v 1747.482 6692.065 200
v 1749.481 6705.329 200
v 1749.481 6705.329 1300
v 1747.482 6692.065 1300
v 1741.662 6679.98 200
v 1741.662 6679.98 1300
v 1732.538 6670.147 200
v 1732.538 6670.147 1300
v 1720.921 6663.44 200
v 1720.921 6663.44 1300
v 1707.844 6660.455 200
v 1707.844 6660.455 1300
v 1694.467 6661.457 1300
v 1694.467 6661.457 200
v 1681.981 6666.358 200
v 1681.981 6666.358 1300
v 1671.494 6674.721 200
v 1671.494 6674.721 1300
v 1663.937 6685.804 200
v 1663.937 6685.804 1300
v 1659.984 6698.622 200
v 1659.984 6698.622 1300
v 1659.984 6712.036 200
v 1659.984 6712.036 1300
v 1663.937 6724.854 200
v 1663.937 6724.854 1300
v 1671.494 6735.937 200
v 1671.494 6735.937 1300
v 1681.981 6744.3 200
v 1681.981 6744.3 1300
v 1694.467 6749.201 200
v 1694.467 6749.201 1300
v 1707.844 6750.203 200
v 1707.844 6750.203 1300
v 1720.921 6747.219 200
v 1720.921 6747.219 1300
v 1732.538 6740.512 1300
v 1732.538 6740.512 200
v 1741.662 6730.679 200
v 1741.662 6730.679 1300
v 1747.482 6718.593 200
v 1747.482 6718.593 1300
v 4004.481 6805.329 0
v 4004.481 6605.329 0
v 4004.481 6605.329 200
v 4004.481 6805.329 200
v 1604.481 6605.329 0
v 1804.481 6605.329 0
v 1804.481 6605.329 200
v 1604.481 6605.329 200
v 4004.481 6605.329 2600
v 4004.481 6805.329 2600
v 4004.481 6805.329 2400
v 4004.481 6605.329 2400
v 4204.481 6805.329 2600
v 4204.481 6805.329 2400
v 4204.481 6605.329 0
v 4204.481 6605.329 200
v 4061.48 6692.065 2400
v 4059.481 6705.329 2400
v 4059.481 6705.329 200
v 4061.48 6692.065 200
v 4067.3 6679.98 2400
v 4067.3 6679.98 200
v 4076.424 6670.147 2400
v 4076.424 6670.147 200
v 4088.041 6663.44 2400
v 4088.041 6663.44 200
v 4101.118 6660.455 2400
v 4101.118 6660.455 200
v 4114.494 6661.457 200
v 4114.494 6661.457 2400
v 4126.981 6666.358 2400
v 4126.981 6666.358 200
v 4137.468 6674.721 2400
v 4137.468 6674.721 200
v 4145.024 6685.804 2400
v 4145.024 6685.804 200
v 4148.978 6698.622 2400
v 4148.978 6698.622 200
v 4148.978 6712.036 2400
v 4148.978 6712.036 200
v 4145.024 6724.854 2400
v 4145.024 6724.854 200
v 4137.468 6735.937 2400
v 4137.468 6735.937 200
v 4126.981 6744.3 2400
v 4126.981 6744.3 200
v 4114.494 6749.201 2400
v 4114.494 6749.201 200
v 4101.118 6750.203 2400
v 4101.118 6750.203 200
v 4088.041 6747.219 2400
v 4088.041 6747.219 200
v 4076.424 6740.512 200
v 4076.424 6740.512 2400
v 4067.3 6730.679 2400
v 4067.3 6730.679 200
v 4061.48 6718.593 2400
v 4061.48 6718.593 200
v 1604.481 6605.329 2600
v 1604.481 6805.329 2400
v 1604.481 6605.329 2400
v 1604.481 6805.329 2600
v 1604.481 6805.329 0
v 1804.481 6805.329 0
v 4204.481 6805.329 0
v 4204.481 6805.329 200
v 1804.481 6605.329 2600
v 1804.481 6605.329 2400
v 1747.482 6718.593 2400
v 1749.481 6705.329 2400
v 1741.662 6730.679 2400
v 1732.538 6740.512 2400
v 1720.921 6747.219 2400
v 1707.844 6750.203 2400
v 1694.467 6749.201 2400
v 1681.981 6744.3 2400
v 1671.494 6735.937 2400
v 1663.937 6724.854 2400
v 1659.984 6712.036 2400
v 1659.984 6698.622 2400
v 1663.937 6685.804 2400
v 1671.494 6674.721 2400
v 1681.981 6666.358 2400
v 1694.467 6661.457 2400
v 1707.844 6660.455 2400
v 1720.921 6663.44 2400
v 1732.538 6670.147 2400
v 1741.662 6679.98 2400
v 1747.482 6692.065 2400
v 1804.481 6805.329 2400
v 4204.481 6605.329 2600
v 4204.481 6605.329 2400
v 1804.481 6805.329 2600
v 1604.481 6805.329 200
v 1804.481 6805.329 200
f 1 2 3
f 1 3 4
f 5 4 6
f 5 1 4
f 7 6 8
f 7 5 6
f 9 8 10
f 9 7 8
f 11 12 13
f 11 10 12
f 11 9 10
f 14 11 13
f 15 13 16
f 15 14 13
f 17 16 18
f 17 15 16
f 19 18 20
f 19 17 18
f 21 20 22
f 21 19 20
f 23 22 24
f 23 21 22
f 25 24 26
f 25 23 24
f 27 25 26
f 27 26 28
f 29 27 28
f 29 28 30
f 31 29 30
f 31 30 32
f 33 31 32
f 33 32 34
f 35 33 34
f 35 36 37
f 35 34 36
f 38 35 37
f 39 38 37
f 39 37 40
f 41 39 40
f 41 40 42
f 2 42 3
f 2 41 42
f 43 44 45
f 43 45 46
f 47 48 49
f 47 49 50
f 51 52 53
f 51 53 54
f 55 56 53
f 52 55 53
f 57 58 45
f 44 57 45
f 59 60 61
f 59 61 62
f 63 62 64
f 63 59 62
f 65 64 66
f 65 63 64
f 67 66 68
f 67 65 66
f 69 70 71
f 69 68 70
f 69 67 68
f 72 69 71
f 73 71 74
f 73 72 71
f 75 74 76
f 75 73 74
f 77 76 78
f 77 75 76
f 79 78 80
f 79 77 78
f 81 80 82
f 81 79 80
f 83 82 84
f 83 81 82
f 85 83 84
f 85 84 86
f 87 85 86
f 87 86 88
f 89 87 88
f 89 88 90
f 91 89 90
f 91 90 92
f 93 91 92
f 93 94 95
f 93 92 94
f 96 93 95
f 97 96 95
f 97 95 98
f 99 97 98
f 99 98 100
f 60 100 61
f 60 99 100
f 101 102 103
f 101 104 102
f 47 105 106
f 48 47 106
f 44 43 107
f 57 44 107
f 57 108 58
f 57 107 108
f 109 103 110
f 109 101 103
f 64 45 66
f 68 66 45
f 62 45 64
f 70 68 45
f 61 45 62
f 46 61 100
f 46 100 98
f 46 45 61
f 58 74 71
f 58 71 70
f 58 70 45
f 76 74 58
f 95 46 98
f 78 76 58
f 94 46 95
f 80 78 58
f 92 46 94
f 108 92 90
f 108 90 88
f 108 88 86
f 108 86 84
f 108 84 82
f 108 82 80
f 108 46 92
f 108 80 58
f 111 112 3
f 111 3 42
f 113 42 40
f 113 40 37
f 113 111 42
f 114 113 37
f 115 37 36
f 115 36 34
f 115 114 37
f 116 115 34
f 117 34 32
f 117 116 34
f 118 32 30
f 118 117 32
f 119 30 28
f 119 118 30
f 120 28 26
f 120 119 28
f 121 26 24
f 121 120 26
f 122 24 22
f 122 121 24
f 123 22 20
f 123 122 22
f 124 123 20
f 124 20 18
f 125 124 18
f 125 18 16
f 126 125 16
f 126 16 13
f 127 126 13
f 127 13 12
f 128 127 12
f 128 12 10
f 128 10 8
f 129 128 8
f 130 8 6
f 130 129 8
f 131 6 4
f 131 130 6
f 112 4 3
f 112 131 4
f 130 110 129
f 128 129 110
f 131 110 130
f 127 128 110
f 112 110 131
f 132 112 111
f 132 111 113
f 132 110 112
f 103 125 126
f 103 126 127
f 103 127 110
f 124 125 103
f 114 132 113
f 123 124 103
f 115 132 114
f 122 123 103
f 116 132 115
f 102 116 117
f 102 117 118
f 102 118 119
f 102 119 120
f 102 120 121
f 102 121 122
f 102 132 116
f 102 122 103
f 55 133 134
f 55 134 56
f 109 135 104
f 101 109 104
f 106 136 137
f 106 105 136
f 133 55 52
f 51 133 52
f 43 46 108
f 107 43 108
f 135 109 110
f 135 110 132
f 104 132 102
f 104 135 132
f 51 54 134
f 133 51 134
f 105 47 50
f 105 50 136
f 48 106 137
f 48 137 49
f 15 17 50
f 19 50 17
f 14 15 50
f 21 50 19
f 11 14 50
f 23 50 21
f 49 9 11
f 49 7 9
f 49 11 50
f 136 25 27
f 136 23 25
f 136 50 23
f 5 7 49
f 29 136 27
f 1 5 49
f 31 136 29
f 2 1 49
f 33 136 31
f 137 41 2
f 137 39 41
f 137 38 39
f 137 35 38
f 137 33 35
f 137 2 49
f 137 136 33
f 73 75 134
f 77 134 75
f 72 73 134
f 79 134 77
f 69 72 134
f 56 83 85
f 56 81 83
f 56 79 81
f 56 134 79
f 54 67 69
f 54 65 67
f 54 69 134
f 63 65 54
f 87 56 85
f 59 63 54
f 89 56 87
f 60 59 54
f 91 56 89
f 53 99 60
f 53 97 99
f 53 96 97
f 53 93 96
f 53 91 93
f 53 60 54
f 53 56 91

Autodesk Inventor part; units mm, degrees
ref_plane "YZ Plane" through (0, 0, 0) normal (1, 0, 0) x (0, 1, 0)
ref_plane "XZ Plane" through (0, 0, 0) normal (0, 1, 0) x (-1, 0, 0)
ref_plane "XY Plane" through (0, 0, 0) normal (0, 0, 1) x (1, 0, 0)
sketch "Sketch1" plane through (0, 0, 0) normal (0, 0, 1) x (1, 0, 0)
  line L0 (1604.4809, 6805.3292) -> (1804.4809, 6805.3292)
  line L1 (1804.4809, 6805.3292) -> (1804.4809, 6605.3292)
  line L2 (1804.4809, 6605.3292) -> (1604.4809, 6605.3292)
  line L3 (1604.4809, 6605.3292) -> (1604.4809, 6805.3292)
  point P0 (0, 0)
  dimension "d0" = 200
  dimension "d1" = 200
extrude "Extrusion1" add sketch "Sketch1" along normal blind 200
sketch "Sketch2" plane through (0, 0, 200) normal (0, 0, 1) x (1, 0, 0)
  line L0 (1804.4809, 6805.3292) -> (1604.4809, 6805.3292) projected
  line L1 (1604.4809, 6605.3292) -> (1804.4809, 6605.3292) projected
  circle A0 centre (1704.4809, 6705.3292) radius 45
  point P0 (0, 0)
  dimension "d4" = 90
extrude "Extrusion2" add sketch "Sketch2" along normal blind 1100
mirror "Mirror1" about plane through (1704.4809, 6705.3292, 1300) normal (0, 0, 1) of "Extrusion2", "Extrusion1"
thread "Thread1" size "M90x6" class "6g" standard "ISO Metric profile" full length
ref_plane "Work Plane1" through (2904.4809, 6605.3292, 2600) normal (1, 0, 0) x (0, 0, -1)
mirror "Mirror2" about plane through (2904.4809, 6605.3292, 2600) normal (1, 0, 0) of "Extrusion2", "Extrusion1", "Mirror1"
properties part number "podstawa"
